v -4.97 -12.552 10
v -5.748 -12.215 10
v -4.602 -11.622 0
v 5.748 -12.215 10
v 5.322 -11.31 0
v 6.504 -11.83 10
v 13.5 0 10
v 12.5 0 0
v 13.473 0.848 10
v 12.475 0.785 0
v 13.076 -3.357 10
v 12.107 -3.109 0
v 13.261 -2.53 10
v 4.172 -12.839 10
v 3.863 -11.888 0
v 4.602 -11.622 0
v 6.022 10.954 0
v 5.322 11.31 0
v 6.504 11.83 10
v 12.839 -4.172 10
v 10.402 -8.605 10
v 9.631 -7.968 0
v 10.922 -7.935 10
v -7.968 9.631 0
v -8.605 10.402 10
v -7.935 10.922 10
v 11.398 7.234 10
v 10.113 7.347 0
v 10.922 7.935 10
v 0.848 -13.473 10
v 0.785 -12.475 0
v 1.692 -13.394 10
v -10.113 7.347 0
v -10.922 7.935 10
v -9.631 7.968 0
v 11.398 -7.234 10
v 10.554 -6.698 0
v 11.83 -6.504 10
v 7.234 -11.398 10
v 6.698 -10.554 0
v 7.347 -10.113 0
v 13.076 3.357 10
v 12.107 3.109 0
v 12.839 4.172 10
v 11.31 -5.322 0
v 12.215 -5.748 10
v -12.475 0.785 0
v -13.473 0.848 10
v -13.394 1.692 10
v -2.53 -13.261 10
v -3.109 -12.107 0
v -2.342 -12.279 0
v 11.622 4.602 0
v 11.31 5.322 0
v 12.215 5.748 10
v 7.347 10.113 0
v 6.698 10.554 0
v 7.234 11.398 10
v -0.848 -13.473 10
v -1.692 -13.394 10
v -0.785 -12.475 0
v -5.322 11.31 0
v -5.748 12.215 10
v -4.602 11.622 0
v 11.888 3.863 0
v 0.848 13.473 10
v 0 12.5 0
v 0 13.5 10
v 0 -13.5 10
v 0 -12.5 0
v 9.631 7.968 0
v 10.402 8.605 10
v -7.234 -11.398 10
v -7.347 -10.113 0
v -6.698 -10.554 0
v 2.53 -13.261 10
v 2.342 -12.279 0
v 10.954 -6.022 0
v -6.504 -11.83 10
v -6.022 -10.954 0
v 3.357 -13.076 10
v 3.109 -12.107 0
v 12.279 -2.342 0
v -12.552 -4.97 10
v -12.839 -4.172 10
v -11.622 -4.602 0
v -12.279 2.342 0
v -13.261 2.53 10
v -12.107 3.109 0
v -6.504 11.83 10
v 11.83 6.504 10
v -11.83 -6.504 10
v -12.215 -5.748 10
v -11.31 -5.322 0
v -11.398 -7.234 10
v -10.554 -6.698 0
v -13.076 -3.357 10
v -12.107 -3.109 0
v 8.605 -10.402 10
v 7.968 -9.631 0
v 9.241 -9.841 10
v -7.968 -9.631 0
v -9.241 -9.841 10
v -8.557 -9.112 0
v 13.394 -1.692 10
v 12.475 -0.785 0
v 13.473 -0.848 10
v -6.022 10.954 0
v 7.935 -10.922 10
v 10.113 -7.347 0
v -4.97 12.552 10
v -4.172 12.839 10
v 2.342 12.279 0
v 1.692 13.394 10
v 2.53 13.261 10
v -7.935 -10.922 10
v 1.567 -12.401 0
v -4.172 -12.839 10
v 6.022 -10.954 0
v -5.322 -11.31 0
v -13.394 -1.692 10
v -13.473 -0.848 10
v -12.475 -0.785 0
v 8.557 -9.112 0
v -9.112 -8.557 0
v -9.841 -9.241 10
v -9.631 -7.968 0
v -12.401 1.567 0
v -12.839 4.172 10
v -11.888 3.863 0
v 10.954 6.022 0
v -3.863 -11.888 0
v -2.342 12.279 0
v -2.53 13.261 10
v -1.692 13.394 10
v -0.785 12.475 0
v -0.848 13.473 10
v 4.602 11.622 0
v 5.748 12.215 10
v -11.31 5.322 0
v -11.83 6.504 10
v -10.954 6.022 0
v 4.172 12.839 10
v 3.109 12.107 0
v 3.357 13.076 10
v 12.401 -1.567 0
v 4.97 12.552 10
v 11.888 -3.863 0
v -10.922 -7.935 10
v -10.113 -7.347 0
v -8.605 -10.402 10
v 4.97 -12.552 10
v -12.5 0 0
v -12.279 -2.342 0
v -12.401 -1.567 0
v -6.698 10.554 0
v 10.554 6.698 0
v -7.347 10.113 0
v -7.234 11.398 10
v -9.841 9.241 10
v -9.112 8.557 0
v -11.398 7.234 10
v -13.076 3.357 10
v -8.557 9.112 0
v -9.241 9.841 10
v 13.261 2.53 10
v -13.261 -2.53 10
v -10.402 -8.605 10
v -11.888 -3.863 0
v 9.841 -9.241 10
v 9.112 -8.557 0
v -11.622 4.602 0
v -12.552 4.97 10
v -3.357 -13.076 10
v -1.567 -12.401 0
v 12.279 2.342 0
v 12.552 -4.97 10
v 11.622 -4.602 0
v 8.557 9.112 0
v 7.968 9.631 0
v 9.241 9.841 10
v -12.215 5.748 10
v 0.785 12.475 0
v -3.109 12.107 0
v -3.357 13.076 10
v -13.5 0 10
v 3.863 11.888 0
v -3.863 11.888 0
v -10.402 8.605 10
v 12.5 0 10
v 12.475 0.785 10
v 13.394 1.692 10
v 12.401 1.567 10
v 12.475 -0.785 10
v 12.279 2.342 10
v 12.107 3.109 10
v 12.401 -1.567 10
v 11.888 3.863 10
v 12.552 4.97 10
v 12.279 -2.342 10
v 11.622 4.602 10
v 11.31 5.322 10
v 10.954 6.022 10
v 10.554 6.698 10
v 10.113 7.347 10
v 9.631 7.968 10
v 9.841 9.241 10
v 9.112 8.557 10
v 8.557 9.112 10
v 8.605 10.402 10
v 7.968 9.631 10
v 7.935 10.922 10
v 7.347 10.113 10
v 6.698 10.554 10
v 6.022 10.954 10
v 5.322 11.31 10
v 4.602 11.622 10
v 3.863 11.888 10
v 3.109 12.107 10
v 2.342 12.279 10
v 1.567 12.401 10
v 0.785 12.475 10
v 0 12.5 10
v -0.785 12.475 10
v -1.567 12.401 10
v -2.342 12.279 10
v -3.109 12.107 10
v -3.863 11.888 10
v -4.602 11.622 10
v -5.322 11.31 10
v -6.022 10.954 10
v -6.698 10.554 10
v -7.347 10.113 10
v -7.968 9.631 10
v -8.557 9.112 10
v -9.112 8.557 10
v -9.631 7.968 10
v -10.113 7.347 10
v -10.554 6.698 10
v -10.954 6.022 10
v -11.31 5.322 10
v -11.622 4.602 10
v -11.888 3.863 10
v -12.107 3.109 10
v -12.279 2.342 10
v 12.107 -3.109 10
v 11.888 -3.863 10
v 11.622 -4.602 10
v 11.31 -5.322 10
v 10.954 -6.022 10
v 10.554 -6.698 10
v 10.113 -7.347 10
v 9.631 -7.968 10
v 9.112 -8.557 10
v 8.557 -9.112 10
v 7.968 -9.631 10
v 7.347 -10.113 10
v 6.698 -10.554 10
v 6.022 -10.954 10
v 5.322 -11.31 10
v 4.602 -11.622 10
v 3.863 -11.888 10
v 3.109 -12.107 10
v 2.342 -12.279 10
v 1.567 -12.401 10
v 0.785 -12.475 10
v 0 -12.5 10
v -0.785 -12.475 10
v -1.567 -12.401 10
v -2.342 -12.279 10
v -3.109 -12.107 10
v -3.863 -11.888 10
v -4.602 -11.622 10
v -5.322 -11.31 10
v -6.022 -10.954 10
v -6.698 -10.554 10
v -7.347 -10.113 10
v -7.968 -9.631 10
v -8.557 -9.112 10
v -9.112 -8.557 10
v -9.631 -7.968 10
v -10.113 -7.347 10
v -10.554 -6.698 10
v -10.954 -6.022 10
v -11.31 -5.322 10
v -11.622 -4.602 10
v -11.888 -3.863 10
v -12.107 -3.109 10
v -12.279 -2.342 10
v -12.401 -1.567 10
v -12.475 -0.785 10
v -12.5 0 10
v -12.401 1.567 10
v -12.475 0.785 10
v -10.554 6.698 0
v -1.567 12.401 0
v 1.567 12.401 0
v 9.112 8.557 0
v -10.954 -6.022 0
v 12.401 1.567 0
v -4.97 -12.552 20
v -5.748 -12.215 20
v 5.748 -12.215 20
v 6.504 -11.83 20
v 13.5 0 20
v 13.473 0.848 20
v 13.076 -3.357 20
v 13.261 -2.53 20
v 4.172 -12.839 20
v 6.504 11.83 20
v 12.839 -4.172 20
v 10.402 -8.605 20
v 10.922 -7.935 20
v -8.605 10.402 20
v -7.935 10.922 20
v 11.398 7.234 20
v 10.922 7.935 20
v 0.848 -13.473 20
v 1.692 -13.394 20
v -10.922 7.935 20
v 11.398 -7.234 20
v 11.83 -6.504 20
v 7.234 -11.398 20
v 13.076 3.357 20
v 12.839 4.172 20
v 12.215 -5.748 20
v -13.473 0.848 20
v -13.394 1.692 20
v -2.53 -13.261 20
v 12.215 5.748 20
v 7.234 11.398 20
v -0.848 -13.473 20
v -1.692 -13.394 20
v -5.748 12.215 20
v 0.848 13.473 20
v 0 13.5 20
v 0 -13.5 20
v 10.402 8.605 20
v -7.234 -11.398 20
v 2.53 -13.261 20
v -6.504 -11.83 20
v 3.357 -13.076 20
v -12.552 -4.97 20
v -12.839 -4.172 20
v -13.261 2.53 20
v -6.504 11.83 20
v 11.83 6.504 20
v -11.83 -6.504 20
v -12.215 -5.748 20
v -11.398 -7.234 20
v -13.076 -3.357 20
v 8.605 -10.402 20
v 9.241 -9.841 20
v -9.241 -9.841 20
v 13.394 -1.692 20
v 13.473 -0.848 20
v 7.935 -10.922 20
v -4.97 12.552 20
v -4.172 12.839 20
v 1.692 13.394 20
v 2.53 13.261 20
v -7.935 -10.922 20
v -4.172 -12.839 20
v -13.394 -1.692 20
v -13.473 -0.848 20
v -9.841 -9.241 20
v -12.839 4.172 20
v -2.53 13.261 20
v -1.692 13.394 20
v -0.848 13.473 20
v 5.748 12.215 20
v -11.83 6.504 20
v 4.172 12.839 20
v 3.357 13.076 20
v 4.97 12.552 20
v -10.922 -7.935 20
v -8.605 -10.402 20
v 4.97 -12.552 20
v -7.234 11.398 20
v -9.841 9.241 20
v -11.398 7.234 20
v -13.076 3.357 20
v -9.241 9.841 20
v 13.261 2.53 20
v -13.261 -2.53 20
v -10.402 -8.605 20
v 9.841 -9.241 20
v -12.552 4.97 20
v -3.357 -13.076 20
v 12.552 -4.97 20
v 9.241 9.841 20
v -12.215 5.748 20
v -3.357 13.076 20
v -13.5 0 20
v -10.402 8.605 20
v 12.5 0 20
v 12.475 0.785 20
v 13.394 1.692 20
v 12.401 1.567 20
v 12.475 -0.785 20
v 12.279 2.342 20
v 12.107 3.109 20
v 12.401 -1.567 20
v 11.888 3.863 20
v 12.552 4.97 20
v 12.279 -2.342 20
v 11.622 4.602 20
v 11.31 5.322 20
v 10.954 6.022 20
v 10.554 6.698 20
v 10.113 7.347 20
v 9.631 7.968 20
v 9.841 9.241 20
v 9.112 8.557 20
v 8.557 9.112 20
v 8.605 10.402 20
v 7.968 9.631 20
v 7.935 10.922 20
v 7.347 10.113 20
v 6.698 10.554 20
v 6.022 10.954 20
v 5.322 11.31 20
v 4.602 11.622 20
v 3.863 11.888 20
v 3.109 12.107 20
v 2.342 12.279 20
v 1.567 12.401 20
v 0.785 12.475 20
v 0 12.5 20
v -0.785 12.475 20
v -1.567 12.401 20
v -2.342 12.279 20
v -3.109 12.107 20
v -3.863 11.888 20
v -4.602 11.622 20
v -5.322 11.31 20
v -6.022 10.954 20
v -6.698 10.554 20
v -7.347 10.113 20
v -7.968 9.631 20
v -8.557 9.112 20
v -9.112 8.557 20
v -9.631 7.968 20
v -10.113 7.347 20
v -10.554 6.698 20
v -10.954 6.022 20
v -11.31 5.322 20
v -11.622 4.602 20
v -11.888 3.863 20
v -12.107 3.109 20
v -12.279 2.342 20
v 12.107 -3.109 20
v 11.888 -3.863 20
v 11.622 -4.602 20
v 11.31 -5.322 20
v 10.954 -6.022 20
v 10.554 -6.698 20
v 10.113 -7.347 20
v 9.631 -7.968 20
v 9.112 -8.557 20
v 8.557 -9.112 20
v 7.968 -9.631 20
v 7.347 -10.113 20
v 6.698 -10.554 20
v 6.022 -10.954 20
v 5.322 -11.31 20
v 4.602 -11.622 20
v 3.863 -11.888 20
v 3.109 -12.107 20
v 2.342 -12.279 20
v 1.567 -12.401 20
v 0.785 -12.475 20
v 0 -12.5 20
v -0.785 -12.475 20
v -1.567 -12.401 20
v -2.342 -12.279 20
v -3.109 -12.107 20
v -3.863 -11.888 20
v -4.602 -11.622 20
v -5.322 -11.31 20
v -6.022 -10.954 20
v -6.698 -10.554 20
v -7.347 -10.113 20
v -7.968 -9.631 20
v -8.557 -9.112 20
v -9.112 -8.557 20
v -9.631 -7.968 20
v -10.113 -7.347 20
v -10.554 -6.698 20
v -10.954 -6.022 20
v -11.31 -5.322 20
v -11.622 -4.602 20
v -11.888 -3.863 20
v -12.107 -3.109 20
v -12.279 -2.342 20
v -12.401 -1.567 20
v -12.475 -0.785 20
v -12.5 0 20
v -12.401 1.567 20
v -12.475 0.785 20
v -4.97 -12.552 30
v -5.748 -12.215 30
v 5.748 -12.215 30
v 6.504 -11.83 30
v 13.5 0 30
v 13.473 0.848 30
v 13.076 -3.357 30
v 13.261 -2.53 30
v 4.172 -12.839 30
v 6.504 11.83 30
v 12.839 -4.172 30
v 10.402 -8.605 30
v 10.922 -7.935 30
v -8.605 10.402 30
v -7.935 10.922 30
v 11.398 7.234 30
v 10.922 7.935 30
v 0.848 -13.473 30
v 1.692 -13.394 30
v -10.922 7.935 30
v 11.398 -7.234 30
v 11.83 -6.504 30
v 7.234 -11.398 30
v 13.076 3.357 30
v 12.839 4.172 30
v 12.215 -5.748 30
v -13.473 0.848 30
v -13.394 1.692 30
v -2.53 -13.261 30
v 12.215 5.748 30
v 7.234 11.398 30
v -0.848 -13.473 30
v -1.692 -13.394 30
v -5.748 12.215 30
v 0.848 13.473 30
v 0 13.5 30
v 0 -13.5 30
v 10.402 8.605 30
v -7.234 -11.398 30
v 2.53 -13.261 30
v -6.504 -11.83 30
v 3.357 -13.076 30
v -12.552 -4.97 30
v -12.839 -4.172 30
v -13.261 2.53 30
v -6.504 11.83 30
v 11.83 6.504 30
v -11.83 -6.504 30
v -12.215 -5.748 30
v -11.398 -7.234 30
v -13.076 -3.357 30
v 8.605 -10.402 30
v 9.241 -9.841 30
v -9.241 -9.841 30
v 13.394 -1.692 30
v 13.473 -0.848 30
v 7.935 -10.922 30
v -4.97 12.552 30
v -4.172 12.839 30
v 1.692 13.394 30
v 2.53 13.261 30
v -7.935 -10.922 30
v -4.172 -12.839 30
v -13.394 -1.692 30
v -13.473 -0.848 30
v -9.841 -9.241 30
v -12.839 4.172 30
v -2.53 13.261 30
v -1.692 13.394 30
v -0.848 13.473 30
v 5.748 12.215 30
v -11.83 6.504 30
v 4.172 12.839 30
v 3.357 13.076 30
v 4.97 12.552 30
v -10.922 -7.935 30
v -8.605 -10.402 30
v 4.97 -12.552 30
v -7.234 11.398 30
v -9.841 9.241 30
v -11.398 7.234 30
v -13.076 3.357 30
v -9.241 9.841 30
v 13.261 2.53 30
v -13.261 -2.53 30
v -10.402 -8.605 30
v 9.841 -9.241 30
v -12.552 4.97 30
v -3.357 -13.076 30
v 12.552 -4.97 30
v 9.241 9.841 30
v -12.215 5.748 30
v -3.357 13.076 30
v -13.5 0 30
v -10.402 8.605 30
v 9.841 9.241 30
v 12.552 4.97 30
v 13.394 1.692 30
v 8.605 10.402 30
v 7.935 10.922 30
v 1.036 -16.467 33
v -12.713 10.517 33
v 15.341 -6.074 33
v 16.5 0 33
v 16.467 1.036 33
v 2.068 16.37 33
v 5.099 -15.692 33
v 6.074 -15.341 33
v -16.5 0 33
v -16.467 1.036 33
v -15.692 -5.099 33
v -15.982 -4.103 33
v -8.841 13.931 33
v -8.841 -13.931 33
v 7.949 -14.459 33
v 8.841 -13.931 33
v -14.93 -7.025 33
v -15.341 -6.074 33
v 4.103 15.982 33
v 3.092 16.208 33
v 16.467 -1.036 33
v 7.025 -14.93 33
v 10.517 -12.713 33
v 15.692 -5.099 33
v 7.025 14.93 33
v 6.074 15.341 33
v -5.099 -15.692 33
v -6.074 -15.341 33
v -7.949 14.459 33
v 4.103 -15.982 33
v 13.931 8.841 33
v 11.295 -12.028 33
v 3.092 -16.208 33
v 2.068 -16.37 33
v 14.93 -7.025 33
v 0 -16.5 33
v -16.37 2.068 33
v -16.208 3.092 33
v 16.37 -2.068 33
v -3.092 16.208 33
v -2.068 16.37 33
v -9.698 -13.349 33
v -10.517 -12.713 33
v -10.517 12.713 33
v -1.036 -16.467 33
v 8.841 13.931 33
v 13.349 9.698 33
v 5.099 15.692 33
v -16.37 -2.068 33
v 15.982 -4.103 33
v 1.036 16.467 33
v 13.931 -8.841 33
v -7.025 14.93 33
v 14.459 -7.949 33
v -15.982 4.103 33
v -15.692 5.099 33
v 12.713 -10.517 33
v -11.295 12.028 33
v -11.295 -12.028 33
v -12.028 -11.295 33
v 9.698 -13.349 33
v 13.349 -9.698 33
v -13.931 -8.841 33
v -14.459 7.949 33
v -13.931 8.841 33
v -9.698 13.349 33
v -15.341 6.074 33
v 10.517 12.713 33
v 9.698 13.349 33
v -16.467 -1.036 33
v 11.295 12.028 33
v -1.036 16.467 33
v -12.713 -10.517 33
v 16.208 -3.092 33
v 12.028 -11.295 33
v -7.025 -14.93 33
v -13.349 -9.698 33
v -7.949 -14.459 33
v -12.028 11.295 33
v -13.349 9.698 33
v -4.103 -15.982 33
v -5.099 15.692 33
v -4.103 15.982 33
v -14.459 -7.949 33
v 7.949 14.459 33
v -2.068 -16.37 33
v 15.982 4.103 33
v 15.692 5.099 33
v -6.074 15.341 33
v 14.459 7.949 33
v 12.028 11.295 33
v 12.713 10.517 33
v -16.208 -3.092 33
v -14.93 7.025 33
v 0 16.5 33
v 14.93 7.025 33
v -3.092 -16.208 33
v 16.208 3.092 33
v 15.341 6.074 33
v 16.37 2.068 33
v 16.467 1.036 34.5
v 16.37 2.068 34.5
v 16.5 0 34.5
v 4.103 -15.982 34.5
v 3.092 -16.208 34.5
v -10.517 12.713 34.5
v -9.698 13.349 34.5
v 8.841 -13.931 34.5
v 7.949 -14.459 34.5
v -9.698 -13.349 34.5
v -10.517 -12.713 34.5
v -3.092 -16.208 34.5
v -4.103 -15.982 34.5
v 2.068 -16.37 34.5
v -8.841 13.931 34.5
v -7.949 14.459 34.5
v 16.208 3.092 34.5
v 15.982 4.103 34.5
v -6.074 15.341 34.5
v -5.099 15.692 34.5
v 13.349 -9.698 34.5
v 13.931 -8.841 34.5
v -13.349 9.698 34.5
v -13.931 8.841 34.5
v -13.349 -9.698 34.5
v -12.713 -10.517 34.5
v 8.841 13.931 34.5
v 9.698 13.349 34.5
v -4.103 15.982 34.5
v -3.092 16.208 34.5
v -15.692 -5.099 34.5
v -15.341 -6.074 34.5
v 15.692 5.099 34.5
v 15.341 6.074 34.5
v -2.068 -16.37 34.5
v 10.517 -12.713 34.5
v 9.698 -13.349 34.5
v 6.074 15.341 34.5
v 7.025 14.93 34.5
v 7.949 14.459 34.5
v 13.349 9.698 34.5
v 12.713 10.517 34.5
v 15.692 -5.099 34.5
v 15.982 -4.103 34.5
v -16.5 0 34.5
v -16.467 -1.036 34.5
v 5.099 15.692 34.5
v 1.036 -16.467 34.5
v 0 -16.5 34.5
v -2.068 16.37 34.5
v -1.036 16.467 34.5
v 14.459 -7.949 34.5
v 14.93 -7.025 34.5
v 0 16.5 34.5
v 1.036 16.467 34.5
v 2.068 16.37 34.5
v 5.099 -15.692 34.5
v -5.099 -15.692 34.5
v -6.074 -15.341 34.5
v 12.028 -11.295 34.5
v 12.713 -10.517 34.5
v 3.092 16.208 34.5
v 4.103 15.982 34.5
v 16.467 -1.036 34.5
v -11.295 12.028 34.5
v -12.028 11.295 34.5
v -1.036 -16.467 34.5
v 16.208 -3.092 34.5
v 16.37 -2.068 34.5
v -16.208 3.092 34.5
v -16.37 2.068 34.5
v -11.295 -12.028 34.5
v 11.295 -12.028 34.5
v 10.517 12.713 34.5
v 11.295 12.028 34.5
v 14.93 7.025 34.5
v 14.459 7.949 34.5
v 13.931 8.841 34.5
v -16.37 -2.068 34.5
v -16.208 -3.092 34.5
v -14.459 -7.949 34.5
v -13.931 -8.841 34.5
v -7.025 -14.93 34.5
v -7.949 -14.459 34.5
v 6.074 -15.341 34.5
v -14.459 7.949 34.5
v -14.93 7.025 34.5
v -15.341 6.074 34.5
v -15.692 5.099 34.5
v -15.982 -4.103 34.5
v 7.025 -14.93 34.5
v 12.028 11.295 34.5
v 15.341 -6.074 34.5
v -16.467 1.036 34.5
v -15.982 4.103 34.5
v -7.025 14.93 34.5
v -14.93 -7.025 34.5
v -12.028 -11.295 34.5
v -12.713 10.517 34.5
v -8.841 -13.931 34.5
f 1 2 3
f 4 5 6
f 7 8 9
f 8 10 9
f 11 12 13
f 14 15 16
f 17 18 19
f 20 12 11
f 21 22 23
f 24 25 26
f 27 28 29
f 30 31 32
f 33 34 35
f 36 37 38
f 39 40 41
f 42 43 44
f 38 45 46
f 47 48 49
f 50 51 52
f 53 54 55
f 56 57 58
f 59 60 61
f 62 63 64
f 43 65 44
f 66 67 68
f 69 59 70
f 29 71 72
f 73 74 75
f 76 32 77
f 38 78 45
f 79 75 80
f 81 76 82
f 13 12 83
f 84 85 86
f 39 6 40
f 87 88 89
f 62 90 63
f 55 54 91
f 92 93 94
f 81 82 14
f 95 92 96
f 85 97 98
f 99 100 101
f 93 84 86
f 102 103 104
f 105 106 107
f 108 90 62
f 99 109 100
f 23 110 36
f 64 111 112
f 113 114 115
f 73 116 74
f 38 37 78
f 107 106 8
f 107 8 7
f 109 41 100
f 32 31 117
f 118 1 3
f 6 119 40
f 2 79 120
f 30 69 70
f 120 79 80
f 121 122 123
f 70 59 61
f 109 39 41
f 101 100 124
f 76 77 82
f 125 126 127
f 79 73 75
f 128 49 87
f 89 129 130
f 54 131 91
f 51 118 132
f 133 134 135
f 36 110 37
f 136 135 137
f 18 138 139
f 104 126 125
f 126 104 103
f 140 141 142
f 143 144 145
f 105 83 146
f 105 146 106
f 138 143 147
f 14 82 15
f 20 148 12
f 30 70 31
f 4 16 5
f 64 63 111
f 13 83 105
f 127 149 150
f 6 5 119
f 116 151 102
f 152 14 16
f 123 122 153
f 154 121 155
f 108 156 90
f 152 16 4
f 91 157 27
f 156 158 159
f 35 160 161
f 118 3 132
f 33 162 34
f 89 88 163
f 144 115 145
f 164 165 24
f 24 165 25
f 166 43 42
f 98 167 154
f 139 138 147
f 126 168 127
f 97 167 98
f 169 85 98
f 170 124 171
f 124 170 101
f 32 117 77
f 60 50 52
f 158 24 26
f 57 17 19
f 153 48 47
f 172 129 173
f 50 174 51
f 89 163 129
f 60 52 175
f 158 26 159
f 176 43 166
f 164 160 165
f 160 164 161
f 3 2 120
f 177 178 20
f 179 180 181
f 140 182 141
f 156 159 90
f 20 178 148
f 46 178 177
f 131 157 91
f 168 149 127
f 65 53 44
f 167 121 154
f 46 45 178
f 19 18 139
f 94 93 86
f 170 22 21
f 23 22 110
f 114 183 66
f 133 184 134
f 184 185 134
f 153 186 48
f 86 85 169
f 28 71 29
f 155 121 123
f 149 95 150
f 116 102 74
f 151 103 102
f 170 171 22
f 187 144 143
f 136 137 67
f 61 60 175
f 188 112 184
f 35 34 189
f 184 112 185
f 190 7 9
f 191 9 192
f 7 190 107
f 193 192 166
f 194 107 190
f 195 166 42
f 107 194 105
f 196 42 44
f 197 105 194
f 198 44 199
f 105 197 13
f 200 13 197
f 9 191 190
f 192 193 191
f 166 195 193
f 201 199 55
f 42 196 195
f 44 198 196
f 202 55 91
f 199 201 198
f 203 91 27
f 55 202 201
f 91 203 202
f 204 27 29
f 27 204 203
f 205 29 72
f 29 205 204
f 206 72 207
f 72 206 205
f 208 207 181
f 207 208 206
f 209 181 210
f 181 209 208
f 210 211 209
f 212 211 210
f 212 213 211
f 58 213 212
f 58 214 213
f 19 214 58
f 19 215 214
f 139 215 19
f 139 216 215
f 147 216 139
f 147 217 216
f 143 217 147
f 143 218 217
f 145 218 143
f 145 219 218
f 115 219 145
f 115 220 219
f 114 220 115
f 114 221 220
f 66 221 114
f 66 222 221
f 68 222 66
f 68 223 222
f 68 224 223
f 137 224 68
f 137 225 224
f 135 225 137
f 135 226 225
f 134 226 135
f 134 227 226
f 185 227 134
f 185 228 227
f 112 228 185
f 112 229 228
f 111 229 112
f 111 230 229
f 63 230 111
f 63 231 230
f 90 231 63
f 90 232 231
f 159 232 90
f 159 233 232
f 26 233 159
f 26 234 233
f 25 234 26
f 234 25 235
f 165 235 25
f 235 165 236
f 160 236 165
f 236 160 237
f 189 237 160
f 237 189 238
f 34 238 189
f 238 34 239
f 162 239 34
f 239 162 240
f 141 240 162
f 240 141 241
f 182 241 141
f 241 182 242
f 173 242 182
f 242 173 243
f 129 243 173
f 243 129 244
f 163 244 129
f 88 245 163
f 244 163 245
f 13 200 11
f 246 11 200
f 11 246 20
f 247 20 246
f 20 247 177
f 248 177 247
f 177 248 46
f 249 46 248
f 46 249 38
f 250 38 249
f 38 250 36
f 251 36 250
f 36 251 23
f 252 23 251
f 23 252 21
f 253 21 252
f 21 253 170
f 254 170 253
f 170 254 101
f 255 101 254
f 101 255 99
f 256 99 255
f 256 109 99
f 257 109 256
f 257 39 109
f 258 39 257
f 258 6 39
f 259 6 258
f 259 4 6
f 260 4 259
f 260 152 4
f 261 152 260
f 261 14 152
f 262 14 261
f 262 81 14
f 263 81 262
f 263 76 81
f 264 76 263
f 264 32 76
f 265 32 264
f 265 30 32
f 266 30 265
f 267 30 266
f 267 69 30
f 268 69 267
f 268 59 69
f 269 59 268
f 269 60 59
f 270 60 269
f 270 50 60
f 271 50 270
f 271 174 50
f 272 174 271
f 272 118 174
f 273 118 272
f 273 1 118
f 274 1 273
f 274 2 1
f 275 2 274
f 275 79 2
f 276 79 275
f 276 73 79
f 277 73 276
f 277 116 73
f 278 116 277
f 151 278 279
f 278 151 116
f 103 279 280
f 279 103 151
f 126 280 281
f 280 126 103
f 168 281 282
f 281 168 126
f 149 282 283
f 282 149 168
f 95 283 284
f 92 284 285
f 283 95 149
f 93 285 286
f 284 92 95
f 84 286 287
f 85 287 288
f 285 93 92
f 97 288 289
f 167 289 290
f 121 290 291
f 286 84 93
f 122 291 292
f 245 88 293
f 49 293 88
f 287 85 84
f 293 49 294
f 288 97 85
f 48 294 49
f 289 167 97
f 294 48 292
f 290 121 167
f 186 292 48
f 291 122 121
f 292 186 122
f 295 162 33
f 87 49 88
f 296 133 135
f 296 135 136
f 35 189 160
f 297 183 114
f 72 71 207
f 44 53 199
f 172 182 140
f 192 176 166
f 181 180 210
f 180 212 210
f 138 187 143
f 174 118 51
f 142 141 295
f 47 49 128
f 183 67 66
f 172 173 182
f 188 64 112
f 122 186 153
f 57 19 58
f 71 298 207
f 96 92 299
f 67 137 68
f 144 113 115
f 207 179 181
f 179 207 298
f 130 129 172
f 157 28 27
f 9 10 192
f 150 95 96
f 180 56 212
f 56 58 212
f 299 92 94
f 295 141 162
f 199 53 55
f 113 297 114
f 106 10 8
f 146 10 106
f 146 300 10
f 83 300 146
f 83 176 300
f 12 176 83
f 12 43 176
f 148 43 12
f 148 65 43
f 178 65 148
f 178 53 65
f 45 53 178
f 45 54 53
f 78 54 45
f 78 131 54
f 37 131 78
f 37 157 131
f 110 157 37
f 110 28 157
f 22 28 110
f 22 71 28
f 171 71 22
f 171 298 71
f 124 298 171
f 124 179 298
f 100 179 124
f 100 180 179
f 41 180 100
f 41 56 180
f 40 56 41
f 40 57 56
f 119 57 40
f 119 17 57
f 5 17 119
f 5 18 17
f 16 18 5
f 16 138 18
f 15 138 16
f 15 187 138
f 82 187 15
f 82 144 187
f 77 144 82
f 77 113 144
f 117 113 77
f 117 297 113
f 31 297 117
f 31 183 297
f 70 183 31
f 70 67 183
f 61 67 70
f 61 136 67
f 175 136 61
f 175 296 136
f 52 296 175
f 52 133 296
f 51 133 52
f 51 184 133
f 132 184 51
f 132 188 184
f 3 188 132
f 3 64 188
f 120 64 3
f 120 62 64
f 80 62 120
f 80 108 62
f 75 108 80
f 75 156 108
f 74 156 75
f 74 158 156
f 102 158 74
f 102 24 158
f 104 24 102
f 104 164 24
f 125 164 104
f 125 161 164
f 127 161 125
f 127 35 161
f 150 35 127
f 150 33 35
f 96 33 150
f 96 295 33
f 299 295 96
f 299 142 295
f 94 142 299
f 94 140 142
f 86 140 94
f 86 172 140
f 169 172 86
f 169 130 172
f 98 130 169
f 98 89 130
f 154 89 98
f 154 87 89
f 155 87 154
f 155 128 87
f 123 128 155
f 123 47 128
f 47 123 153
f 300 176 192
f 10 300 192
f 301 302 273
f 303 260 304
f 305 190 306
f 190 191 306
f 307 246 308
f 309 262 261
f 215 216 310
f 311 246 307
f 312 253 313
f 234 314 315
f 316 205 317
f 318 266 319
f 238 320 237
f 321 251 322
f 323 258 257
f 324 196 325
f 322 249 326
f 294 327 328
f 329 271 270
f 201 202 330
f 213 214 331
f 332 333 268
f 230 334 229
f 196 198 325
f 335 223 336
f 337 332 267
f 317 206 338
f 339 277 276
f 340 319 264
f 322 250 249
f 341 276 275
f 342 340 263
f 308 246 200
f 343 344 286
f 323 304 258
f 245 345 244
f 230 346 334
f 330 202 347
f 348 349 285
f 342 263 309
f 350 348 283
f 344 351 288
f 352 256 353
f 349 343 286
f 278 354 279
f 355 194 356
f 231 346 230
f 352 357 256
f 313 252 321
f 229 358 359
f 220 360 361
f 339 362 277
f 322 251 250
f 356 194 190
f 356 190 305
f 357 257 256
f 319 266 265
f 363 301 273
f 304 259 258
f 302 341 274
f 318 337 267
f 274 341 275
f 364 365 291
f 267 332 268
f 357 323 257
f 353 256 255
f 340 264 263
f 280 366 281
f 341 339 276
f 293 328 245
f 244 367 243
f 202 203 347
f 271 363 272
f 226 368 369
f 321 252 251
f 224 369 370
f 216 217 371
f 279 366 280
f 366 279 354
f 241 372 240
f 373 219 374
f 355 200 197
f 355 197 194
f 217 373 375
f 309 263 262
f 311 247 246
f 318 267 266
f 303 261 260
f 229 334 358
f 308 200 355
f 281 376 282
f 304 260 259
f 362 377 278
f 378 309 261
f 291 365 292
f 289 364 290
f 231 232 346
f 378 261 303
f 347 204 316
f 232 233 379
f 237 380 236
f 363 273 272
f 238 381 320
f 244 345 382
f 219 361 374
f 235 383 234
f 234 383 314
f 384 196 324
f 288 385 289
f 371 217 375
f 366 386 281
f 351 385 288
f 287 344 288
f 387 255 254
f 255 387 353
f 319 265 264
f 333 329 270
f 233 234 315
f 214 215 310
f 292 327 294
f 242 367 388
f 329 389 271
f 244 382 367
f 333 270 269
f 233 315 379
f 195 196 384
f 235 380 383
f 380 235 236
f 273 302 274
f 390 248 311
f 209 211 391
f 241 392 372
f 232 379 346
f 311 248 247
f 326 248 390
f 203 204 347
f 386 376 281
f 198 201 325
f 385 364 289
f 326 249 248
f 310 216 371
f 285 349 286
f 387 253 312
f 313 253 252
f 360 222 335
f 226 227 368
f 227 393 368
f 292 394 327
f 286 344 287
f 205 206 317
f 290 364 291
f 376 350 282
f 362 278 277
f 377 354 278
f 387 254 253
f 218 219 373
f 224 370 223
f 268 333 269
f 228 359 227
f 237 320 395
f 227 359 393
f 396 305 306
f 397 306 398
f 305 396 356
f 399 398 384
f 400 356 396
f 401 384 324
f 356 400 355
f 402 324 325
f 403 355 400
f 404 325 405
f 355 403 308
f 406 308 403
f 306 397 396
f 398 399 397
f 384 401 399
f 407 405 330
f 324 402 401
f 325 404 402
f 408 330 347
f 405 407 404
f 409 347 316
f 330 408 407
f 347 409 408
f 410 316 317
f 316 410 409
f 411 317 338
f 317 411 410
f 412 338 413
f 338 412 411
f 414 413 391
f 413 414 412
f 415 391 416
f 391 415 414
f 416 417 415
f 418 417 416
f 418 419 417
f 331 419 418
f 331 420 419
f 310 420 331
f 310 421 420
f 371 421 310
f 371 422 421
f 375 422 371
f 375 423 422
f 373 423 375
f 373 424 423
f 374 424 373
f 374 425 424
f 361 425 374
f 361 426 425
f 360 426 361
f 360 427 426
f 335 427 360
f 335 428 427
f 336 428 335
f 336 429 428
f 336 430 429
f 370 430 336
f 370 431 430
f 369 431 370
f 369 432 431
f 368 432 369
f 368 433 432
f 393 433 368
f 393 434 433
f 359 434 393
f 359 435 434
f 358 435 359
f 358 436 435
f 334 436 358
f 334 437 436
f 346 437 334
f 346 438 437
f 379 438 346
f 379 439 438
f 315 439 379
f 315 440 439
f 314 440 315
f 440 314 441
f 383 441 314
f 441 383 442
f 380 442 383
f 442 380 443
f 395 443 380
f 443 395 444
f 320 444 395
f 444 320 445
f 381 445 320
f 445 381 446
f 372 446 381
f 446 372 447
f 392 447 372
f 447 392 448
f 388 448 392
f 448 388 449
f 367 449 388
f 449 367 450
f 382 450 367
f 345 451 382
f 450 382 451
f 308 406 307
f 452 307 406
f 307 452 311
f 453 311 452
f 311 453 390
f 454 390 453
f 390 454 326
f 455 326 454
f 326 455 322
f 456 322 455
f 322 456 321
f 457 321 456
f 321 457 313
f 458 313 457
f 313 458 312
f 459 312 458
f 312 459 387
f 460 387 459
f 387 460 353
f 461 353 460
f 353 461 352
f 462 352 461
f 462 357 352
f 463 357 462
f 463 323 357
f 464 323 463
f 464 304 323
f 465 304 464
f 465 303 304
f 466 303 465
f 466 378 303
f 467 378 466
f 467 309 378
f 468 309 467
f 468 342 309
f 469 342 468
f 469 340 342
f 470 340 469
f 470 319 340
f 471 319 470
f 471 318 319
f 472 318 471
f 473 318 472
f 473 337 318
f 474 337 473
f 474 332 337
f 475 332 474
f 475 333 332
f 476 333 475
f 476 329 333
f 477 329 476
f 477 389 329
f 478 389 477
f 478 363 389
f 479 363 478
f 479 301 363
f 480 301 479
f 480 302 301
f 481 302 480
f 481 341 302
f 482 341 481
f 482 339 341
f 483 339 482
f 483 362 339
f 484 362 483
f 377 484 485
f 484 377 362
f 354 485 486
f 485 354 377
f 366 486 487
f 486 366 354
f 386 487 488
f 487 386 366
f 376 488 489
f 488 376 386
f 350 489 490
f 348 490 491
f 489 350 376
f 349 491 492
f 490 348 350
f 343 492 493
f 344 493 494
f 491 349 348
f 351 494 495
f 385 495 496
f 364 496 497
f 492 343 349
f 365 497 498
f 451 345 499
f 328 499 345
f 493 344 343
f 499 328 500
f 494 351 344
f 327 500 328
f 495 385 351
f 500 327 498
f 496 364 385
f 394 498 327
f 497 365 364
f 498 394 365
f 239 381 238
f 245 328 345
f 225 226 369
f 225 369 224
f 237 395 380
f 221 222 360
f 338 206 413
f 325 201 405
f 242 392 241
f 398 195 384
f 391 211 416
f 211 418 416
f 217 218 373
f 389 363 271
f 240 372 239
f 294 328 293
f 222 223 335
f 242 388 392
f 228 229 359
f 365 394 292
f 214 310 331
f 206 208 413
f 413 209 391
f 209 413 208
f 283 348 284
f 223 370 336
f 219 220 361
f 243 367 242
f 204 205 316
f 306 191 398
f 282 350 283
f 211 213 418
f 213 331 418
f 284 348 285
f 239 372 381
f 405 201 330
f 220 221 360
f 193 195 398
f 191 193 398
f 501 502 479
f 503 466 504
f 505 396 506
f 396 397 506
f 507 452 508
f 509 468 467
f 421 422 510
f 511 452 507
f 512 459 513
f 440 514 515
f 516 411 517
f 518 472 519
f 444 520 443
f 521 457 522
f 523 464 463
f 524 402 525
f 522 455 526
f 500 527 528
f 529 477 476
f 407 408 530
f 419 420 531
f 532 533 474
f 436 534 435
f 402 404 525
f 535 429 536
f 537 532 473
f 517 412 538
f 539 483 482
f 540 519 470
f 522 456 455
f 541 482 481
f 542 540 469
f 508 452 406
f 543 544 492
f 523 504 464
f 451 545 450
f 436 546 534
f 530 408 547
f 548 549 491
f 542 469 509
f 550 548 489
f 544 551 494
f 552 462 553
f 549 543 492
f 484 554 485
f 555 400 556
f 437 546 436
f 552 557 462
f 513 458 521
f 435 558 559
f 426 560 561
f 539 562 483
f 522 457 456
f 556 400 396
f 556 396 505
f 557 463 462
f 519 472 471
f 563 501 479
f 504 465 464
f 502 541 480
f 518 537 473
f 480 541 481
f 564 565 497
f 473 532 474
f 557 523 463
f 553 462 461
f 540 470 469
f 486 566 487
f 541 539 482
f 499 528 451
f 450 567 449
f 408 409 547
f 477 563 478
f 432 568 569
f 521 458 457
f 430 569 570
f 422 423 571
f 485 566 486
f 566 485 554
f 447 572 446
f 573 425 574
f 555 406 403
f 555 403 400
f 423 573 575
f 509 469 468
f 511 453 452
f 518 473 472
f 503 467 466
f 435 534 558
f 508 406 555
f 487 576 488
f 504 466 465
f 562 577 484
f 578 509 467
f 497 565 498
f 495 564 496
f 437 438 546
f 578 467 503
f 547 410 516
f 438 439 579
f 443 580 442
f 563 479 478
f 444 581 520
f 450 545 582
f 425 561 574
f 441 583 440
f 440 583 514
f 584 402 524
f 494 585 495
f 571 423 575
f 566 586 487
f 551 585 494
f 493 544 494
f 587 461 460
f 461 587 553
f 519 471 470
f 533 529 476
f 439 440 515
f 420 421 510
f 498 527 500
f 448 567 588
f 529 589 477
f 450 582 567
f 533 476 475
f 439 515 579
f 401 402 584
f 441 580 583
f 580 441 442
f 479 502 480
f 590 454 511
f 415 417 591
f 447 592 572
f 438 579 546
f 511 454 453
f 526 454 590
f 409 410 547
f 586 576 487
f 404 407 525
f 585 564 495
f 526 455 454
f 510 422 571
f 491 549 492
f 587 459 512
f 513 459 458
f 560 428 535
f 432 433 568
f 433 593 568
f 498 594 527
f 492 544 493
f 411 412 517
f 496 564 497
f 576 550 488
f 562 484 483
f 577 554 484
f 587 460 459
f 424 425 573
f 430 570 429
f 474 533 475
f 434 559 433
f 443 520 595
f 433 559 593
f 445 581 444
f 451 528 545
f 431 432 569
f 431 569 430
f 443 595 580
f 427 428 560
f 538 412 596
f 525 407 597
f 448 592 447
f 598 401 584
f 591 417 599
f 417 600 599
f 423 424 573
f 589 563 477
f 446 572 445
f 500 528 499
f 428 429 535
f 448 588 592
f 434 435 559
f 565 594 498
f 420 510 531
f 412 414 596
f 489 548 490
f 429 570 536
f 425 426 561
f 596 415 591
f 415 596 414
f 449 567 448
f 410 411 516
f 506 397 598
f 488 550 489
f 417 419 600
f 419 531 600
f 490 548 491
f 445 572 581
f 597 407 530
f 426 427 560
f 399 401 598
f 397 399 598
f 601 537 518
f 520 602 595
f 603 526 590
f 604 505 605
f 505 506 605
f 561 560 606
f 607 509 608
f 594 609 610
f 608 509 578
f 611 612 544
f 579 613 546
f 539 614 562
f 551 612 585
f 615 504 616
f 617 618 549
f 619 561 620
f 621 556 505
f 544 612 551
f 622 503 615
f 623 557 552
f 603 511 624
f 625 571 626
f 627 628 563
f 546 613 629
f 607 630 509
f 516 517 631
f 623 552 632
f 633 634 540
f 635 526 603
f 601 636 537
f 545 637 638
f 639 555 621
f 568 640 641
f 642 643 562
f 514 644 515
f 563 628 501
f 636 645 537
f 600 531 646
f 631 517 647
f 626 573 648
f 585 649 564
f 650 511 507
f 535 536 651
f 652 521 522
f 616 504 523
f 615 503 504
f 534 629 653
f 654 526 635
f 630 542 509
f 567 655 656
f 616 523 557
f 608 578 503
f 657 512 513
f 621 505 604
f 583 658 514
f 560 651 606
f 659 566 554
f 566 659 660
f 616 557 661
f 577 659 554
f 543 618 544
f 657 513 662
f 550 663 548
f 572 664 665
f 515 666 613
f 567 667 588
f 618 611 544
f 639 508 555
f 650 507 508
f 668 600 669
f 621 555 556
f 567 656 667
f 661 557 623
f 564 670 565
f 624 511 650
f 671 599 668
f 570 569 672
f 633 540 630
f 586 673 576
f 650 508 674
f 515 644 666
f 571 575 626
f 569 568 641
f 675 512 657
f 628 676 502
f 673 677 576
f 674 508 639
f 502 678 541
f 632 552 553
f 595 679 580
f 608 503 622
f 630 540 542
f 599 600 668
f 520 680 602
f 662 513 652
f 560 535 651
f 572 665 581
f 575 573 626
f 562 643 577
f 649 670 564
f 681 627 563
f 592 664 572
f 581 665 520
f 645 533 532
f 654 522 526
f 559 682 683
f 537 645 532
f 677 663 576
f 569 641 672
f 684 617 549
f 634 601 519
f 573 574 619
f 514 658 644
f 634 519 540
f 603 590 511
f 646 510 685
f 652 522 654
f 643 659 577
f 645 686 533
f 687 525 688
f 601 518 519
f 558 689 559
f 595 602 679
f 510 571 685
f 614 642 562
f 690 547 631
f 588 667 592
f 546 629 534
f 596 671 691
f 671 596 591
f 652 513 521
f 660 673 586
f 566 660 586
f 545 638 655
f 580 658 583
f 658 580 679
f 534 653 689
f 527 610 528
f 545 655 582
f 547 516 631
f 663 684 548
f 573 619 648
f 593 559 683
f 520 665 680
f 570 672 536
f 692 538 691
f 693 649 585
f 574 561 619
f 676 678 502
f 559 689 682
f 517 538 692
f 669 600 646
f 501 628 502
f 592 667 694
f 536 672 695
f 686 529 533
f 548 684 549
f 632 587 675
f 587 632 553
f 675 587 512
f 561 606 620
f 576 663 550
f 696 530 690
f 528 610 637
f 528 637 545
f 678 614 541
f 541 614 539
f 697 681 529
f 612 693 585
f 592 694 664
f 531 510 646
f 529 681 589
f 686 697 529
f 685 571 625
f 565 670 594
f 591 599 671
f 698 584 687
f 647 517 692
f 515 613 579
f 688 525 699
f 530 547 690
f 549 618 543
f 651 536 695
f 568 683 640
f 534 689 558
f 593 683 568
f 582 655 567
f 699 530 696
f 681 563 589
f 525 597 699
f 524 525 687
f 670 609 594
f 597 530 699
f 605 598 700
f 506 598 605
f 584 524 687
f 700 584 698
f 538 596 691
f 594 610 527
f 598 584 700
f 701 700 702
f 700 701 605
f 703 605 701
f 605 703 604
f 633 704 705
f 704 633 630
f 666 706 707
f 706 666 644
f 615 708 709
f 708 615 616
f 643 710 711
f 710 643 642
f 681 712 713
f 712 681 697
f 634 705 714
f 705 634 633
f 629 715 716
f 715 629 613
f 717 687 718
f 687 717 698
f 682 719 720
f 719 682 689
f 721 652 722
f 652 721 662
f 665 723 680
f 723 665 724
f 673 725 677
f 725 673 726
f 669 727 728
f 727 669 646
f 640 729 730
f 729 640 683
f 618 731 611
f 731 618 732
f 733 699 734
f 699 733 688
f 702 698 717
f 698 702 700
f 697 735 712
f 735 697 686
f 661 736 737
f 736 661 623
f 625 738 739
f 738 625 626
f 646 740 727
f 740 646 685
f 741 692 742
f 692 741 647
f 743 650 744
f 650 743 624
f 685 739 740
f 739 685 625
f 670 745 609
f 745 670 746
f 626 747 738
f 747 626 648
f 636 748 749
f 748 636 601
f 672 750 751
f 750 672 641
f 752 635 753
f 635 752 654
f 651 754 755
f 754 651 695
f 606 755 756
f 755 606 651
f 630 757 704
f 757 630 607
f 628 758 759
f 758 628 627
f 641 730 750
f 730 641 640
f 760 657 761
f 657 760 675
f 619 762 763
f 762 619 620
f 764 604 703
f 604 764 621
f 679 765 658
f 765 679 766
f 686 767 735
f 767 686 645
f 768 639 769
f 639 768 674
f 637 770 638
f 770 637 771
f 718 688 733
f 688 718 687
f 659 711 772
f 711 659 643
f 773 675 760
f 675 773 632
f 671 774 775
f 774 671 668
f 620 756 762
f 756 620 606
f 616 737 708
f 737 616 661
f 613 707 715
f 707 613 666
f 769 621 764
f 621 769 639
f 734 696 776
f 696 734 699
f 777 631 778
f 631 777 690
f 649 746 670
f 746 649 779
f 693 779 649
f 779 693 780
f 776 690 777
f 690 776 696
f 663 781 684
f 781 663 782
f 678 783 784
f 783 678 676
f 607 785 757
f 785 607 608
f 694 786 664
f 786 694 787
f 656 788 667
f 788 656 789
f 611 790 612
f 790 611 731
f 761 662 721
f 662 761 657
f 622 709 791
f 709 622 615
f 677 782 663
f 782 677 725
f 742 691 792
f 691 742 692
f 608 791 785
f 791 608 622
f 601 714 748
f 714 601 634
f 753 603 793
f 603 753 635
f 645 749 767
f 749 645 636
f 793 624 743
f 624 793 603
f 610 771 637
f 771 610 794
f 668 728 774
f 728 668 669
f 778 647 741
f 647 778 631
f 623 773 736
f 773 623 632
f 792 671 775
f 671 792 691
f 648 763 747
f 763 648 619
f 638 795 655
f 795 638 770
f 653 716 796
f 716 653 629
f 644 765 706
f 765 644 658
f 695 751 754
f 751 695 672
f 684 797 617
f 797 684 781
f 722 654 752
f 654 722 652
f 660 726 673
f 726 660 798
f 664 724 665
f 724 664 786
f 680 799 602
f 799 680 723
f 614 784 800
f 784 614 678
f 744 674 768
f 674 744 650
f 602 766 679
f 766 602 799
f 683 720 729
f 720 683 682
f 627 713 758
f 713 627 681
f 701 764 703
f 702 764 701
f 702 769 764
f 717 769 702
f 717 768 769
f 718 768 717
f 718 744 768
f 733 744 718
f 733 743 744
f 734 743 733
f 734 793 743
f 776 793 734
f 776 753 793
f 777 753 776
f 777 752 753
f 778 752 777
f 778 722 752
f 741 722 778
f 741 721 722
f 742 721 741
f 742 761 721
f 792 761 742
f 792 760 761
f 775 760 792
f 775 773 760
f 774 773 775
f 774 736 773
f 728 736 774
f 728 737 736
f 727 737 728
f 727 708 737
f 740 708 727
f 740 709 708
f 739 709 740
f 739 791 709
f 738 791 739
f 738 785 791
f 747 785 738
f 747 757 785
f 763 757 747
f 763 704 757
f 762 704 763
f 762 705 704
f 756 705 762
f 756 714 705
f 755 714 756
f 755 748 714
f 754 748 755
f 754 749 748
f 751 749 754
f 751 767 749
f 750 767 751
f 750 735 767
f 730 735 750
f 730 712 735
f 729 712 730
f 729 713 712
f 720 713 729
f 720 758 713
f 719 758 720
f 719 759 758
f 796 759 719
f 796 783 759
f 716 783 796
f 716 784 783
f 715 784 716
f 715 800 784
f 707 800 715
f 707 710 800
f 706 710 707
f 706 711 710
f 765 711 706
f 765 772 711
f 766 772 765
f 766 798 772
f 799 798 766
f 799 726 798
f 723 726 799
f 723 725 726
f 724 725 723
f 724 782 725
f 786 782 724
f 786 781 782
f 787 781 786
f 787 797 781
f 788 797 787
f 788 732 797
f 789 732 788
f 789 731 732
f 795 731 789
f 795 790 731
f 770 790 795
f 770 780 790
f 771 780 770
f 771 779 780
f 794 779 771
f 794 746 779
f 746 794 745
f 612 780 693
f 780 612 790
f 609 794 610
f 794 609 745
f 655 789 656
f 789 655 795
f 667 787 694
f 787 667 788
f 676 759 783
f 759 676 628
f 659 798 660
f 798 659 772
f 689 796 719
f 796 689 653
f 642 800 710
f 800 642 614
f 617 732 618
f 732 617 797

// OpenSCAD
$fn=100;

dOuterSmall=12.5;
dOuterBig=13.5;

dInnerSmall=9.5;
dInnerBig=10.5;

dDepth=3;
dHeight=10;


//tFitting_10_2x13();
terminator_13();


module tFitting_10_2x13() {
	translate([0, 0, dOuterSmall]) _all();
}

module terminator_13() {
	terminator(dHeight, dOuterSmall, dOuterBig);
}




module terminator(height, small, big) {
	cylinder(h=height, r1=small, r2=big);
	translate([0, 0, height]) cylinder(h=height, r1=small, r2=big);
	translate([0, 0, 2*height]) cylinder(h=height, r1=small, r2=big);
	translate([0, 0, 3*height]) cylinder(h=3, r1=big, r2=big+3);
	translate([0, 0, 3*height+3]) cylinder(h=1.5, r=big+3);
}


module _all() {
	difference() {
		_connections();
		translate([-100, -100, -200-dOuterSmall]) cube(200);
		_star();
		translate([-100, -100, dOuterBig]) cube(200);
	}
}

module _star() {
	union() {
		hull() {
			translate([0, 0, 0]) sphere(r=dOuterSmall-dDepth);
			translate([-5*dHeight, 0, dInnerSmall-dOuterSmall]) sphere(r=dInnerSmall-dDepth);
		}
		rotate(a=[0, 90, 135+180]) cylinder(r=dOuterSmall-dDepth, h=100);
		rotate(a=[0, 90, 225+180]) cylinder(r=dOuterSmall-dDepth, h=100);
	}
}

module _connections() {
	union() {
		scale([1.4, 1, 1]) sphere(r=20);
		translate([-5*dHeight, 0, dInnerSmall-dOuterSmall]) _fitting(dHeight, dInnerSmall, dInnerBig);
		rotate(a=[0, 0, 135]) translate([-5*dHeight, 0, 0]) _fitting(dHeight, dOuterSmall, dOuterBig);
		rotate(a=[0, 0, 225]) translate([-5*dHeight, 0, 0]) _fitting(dHeight, dOuterSmall, dOuterBig);
	}
}

module _fitting(height, small, big) {
	rotate(a=[0, 90, 0]) {
		union() {
			cylinder(h=height, r1=small, r2=big);
			translate([0, 0, 1*height]) cylinder(h=height, r1=small, r2=big);
			translate([0, 0, 2*height]) cylinder(h=height, r1=small, r2=big);
			translate([0, 0, 3*height]) cylinder(h=height, r1=small, r2=big);
		}
	}
}
